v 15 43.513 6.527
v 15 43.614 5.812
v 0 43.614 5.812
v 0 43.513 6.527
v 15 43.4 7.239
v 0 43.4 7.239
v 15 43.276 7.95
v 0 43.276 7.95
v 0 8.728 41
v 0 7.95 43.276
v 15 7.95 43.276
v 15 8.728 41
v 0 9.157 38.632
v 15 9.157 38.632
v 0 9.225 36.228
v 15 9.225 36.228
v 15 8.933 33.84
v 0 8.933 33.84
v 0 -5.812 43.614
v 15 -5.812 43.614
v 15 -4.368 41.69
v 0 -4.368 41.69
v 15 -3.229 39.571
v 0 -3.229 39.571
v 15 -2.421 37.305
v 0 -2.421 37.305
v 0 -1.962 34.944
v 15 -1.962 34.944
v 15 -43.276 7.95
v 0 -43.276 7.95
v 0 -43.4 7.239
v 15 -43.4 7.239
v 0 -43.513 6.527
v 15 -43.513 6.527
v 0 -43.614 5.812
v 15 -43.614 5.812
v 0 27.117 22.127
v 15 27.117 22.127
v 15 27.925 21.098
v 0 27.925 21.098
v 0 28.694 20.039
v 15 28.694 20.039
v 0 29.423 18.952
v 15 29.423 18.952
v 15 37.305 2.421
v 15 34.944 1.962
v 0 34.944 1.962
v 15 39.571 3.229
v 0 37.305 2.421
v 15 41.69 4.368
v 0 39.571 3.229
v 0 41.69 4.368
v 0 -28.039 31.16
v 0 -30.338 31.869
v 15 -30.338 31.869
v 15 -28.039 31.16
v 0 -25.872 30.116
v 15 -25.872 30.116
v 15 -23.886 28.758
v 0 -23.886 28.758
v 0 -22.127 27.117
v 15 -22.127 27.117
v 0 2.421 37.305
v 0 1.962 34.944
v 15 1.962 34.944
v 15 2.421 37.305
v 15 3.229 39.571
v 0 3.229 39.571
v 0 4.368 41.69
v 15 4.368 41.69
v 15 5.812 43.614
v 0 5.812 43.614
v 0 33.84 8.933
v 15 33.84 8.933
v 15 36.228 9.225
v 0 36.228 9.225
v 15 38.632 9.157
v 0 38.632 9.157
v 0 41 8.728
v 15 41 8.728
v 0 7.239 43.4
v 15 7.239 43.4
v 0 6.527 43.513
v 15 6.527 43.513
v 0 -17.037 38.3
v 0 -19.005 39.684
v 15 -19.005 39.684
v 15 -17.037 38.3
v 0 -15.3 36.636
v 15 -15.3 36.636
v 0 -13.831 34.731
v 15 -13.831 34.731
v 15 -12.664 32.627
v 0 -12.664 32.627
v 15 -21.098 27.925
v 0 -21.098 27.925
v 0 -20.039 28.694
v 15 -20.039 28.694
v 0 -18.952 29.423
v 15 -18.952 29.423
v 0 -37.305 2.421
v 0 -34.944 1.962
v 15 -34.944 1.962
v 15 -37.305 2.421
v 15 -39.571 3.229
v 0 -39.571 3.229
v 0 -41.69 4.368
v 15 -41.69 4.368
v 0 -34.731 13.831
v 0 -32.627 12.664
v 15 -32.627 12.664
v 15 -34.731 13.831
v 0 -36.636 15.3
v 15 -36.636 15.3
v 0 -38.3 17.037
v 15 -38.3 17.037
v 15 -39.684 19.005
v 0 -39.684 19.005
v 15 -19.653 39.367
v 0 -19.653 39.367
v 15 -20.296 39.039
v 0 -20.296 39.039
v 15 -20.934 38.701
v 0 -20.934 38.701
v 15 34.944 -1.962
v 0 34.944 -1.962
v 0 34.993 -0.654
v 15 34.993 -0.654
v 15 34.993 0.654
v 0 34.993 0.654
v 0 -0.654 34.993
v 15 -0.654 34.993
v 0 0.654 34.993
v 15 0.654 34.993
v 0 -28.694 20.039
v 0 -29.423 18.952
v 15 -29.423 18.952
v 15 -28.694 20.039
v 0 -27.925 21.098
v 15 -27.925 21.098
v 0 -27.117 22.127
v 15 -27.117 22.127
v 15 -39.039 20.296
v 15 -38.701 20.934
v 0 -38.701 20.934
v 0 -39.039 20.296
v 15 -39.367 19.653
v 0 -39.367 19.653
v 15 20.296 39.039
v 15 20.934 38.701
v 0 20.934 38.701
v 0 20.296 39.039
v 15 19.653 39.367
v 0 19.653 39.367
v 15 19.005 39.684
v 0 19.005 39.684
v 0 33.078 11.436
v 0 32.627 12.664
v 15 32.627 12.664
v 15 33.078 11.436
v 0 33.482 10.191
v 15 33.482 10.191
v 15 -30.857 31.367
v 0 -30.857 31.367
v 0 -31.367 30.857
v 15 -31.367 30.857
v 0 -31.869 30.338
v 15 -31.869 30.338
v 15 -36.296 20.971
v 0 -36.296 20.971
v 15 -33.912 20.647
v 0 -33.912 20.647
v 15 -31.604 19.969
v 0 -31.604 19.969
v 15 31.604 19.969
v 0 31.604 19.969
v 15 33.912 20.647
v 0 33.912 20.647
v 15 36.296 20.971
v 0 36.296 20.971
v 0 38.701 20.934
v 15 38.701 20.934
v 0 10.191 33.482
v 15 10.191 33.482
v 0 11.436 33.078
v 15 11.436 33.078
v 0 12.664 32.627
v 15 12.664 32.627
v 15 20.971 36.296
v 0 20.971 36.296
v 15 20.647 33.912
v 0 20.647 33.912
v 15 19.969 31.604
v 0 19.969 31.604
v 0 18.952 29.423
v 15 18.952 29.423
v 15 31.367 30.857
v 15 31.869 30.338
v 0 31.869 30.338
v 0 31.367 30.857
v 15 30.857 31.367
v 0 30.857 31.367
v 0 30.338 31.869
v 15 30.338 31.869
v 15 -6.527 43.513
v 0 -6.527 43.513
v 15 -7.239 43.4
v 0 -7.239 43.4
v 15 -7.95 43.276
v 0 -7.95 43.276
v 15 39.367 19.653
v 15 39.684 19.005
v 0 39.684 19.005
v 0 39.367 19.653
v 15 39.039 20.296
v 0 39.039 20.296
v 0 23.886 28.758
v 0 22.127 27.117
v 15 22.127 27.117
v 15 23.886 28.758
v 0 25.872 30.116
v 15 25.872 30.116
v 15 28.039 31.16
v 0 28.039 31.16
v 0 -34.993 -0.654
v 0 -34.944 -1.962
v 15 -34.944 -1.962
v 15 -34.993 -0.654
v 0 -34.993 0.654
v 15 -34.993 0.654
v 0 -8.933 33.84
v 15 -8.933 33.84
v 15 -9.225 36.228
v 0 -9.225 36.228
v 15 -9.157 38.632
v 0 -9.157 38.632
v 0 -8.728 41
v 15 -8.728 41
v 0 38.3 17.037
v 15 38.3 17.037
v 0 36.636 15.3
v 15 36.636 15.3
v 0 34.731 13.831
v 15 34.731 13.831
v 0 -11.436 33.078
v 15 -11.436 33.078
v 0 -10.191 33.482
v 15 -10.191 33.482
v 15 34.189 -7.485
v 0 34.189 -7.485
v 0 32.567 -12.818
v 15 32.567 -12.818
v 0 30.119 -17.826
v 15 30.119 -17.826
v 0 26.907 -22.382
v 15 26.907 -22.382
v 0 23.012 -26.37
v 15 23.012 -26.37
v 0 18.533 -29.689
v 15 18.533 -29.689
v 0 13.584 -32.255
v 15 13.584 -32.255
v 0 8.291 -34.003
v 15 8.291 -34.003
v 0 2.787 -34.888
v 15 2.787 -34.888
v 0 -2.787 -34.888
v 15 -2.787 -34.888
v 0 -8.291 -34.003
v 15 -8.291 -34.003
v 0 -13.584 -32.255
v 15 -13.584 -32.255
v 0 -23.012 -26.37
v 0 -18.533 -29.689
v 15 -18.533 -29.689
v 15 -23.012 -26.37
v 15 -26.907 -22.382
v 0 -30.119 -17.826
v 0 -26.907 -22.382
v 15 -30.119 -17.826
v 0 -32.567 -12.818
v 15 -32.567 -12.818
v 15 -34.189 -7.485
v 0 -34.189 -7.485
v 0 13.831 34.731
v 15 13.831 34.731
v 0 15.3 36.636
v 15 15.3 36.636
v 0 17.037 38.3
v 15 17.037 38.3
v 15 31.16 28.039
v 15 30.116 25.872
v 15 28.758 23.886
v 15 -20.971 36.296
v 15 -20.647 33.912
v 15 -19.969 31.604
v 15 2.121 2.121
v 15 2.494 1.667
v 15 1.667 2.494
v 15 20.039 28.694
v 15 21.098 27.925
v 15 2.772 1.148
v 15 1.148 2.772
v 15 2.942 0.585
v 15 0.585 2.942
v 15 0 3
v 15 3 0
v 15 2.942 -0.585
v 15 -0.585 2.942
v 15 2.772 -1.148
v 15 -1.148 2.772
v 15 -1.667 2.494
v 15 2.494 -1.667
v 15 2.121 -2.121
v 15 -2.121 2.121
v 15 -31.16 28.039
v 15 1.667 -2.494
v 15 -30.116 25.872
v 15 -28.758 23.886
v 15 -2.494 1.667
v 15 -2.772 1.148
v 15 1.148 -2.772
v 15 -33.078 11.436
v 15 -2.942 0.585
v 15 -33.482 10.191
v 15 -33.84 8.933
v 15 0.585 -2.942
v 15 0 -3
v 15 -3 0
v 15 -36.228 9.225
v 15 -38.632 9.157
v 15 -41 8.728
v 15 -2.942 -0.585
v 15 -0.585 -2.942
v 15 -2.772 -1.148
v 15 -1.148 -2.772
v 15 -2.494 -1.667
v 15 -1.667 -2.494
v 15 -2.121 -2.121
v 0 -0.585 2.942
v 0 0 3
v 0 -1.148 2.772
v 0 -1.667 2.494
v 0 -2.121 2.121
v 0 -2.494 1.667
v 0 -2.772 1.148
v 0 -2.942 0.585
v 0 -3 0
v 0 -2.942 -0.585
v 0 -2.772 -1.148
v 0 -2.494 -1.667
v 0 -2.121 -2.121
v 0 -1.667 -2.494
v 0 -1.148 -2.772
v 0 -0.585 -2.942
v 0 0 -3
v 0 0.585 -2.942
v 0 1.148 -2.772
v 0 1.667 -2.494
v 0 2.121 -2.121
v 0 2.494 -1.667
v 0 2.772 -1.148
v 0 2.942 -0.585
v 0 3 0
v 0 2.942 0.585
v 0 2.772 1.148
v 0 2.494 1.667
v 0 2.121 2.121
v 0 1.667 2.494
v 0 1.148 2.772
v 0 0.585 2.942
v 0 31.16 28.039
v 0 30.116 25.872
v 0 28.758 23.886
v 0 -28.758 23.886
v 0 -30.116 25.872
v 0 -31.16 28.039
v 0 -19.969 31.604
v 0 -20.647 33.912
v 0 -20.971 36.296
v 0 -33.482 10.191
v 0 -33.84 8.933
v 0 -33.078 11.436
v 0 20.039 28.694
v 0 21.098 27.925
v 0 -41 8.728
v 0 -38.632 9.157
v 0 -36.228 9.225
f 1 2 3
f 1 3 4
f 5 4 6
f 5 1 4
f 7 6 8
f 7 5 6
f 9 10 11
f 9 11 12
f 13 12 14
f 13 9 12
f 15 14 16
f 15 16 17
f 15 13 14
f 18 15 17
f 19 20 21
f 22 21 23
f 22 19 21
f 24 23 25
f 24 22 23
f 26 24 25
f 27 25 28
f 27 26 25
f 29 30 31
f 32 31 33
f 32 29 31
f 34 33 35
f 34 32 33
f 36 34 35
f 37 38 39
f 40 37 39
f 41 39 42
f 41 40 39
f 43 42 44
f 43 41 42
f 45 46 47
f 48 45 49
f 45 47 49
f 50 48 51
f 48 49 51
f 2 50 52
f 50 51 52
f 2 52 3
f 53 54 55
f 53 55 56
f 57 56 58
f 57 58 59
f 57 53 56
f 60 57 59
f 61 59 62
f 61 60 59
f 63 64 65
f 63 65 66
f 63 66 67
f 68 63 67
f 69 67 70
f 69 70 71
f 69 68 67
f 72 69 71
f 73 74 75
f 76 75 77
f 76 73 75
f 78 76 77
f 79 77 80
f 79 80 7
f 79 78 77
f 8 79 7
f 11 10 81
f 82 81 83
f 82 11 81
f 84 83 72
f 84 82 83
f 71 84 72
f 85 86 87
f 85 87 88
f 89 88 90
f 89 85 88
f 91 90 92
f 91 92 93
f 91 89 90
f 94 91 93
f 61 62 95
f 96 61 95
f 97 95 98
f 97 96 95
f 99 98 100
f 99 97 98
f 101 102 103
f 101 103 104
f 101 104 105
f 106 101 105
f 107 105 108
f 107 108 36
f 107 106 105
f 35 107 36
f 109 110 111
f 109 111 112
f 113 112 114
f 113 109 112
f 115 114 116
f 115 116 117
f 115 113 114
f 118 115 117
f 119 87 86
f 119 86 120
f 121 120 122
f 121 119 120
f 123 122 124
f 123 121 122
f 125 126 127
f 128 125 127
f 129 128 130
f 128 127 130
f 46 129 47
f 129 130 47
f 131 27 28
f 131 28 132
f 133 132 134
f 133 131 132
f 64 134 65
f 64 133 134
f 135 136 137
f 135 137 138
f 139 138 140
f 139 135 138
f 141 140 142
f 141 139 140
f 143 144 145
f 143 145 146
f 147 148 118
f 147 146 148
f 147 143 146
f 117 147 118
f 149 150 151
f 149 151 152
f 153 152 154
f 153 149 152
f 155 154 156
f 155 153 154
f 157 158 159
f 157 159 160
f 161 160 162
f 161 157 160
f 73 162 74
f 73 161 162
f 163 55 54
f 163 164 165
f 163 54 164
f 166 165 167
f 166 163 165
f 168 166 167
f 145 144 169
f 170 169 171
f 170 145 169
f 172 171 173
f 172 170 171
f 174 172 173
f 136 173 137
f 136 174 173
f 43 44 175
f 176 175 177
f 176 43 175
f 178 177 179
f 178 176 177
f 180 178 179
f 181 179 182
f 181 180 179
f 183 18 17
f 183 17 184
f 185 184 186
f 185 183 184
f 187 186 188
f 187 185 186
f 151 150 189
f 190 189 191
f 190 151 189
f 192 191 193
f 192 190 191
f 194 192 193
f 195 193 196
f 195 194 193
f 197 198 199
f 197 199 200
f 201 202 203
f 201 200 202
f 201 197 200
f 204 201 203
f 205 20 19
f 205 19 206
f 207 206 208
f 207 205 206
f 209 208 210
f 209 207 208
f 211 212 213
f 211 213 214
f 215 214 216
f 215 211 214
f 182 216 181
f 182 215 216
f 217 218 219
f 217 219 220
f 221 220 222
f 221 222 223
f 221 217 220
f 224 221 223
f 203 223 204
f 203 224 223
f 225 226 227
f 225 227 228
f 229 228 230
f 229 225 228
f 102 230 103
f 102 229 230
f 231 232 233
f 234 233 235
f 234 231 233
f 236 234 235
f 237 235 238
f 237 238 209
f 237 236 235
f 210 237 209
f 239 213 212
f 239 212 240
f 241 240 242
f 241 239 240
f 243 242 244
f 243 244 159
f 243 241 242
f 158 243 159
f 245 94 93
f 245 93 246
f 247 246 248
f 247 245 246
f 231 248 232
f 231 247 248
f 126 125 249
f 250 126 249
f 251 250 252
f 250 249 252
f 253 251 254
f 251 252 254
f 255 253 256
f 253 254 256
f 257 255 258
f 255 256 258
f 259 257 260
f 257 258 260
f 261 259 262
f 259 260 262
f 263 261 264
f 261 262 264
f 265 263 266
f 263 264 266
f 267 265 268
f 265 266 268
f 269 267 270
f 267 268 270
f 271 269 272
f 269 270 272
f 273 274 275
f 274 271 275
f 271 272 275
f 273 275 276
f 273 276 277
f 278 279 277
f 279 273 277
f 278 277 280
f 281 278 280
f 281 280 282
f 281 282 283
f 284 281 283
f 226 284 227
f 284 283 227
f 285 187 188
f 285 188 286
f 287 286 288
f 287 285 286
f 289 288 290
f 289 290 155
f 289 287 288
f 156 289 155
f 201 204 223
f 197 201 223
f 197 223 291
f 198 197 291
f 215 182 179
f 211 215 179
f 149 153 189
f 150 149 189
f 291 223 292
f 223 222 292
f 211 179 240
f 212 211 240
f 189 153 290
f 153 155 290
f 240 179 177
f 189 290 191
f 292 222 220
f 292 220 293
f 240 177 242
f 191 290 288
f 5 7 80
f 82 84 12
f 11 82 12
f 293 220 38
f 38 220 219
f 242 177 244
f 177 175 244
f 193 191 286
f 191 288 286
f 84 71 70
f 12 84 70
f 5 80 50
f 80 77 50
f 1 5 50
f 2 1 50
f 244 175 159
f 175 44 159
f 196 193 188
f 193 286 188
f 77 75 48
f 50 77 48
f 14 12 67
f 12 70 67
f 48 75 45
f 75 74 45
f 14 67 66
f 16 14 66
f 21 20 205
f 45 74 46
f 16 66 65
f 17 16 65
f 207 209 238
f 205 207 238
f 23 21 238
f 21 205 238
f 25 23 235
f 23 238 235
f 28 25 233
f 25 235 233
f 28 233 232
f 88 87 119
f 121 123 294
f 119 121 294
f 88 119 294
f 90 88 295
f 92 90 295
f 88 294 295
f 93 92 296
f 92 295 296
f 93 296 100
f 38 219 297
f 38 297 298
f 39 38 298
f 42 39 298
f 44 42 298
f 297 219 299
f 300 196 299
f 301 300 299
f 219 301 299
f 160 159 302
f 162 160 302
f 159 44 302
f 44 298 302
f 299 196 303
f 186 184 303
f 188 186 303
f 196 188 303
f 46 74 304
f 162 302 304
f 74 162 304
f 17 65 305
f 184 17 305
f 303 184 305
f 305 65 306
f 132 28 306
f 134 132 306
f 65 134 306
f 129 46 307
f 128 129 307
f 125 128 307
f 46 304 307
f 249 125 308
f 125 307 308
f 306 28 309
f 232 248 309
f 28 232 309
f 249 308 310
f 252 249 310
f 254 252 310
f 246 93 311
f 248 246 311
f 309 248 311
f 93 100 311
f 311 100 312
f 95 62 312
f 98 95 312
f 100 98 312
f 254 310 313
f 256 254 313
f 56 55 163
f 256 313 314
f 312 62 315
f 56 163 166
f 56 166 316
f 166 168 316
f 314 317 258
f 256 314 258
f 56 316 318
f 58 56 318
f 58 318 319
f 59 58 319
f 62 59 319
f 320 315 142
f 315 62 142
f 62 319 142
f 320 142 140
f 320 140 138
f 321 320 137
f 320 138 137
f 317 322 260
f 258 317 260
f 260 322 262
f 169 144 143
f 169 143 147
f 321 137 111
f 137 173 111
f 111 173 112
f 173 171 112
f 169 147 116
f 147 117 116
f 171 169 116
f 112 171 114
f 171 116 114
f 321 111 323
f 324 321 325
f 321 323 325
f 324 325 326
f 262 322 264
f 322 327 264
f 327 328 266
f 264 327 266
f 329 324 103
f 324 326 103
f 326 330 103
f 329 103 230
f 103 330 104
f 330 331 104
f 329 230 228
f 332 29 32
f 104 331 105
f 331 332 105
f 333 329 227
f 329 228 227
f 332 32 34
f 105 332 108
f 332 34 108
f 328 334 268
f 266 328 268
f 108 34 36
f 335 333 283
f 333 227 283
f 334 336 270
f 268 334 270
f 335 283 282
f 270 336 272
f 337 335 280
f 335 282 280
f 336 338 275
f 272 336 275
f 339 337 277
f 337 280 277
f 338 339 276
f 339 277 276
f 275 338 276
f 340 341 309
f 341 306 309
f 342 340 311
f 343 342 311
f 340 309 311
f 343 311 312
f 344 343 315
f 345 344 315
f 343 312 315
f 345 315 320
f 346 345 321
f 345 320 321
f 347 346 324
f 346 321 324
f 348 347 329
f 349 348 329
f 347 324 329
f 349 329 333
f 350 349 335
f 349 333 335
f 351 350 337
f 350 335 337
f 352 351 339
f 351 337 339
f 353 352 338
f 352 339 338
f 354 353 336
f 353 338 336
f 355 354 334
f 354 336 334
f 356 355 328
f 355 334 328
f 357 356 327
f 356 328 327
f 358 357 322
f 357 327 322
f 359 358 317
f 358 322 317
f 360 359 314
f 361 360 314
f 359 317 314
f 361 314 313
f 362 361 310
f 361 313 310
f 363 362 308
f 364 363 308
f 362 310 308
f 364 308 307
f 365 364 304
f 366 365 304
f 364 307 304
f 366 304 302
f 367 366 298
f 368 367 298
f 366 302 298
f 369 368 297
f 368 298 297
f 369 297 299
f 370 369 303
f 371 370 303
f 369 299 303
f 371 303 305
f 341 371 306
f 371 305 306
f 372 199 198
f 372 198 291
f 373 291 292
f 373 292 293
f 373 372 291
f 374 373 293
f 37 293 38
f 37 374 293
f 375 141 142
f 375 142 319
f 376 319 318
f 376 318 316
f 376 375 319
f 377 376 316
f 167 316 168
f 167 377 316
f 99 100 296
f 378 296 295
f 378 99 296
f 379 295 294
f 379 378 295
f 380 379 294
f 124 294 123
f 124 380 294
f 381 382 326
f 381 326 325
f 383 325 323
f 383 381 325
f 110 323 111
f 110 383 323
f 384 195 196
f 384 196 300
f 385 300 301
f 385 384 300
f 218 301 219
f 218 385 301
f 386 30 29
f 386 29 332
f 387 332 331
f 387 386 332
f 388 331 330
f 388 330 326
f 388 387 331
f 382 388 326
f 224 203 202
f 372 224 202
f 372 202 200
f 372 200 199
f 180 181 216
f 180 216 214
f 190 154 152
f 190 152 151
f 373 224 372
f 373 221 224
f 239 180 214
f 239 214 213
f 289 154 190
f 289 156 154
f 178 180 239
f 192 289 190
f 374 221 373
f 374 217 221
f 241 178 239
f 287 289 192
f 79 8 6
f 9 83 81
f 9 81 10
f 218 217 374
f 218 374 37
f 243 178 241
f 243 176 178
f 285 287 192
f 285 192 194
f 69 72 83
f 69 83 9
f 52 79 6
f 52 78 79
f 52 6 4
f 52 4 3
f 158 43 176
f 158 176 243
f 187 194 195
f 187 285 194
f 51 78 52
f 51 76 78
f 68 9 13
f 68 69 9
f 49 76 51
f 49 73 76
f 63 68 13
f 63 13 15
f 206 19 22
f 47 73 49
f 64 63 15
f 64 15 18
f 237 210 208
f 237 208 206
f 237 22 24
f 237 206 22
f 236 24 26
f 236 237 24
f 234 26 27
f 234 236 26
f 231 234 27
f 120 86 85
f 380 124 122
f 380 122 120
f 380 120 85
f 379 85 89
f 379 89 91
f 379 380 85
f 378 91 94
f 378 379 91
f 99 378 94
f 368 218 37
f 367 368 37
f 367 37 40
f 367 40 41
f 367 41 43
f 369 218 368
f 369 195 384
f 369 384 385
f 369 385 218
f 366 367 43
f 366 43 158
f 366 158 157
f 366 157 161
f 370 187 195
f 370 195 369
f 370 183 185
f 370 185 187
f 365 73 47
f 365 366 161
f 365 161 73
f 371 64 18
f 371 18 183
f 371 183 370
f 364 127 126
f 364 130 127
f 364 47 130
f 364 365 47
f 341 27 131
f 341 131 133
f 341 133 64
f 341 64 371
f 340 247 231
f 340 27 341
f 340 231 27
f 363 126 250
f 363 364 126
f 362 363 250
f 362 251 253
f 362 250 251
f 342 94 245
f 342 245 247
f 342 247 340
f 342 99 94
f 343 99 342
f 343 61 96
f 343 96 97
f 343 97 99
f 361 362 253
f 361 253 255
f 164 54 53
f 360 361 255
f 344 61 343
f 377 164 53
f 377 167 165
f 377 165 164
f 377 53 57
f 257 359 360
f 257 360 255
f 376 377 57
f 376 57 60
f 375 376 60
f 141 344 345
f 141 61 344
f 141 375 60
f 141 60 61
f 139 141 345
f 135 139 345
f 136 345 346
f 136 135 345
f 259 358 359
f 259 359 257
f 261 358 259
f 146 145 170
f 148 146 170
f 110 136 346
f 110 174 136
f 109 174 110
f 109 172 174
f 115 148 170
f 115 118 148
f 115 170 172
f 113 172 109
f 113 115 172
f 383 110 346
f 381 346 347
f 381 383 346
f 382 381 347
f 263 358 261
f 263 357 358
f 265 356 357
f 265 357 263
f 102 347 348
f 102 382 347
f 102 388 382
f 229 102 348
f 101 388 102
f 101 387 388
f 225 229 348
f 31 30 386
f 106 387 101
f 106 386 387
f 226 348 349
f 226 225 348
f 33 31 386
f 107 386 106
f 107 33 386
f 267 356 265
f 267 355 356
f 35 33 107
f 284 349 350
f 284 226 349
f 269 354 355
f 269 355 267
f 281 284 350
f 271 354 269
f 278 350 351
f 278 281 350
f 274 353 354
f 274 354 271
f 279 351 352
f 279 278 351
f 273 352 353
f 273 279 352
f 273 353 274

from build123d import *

# Parameters (mm, degrees)
BASPROSKE_W        = 15
BASPROSKE_H        = 44
TOOTHCUT_DEPTH     = 65.007812023
TEETHCUTS_DEPTH    = 15
BORSKE_R           = 3
BORE_DEPTH         = 50.0000508
CUT_EXTRUDE1_REACH = 65.743


# Read off the part's stored shape, not the designer's step: TeethCuts
with BuildPart() as part:
    # BasProSke → Base-Revolve (revolve)
    with BuildSketch(Plane(origin=(0, 0, 0), x_dir=(1, 0, 0), z_dir=(0, 1, 0)), mode=Mode.PRIVATE) as base_revolve_sk:
        with Locations((7.5, 22)):
            Rectangle(BASPROSKE_W, BASPROSKE_H)
    revolve(base_revolve_sk.sketch.rotate(Axis((-10, 0, 0), (1, 0, 0)), 180), axis=Axis((-10, 0, 0), (1, 0, 0)))

    # TooCutSke → ToothCut (cut, through all)
    with BuildSketch(Plane(origin=(0, 0, 0), x_dir=(0, 0, -1), z_dir=(1, 0, 0))):
        with BuildLine():
            ThreePointArc((1.961730392, 34.943978235), (0, 34.999), (-1.961730392, 34.943978235))
            ThreePointArc((-1.961730392, 34.943978235), (-3.235659864, 39.585086827), (-5.832115241, 43.637395396))
            ThreePointArc((-5.832115241, 43.637395396), (0, 44.0254), (5.832115241, 43.637395396))
            ThreePointArc((5.832115241, 43.637395396), (3.235659864, 39.585086827), (1.961730392, 34.943978235))
        make_face()
    extrude(amount=TOOTHCUT_DEPTH, mode=Mode.SUBTRACT)

    # TeethCuts outline → TeethCuts (cut)
    with BuildSketch(Plane.YZ):
        with BuildLine():
            ThreePointArc((39.683804298, 19.005148682), (36.636439054, 15.299557845), (32.627490176, 12.663999598))
            ThreePointArc((32.627490176, 12.663999598), (33.286027014, 10.815285786), (33.839906235, 8.932566653))
            ThreePointArc((33.839906235, 8.932566653), (38.632356276, 9.156756269), (43.275818192, 7.950066657))
            ThreePointArc((43.275818192, 7.950066657), (41.846486717, 13.596747753), (39.683804298, 19.005148682))
        make_face()
        with BuildLine():
            ThreePointArc((-34.943978235, 1.961730392), (-39.571147477, 3.229461904), (-43.614454593, 5.812000568))
            ThreePointArc((-43.614454593, 5.812000568), (-44, 0), (-43.614454592, -5.812000568))
            ThreePointArc((-43.614454592, -5.812000568), (-39.571147477, -3.229461904), (-34.943978235, -1.961730392))
            ThreePointArc((-34.943978235, -1.961730392), (-34.999, 0), (-34.943978235, 1.961730392))
        make_face()
        with BuildLine():
            ThreePointArc((-32.627490176, 12.663999598), (-36.636439054, 15.299557845), (-39.683804298, 19.005148682))
            ThreePointArc((-39.683804298, 19.005148682), (-41.846486717, 13.596747753), (-43.275818192, 7.950066657))
            ThreePointArc((-43.275818192, 7.950066657), (-38.632356276, 9.156756269), (-33.839906235, 8.932566653))
            ThreePointArc((-33.839906235, 8.932566653), (-33.286027014, 10.815285786), (-32.627490176, 12.663999598))
        make_face()
        with BuildLine():
            ThreePointArc((-27.117196049, 22.126628289), (-30.115500715, 25.872026467), (-31.868626746, 30.337940427))
            ThreePointArc((-31.868626746, 30.337940427), (-35.596747753, 25.862551101), (-38.701043186, 20.933925966))
            ThreePointArc((-38.701043186, 20.933925966), (-33.911960876, 20.64664734), (-29.423348436, 18.952481837))
            ThreePointArc((-29.423348436, 18.952481837), (-28.314785786, 20.571896045), (-27.117196049, 22.126628289))
        make_face()
        with BuildLine():
            ThreePointArc((-18.952481837, 29.423348436), (-20.64664734, 33.911960876), (-20.933925966, 38.701043186))
            ThreePointArc((-20.933925966, 38.701043186), (-25.862551101, 35.596747753), (-30.337940427, 31.868626746))
            ThreePointArc((-30.337940427, 31.868626746), (-25.872026467, 30.115500715), (-22.126628289, 27.117196049))
            ThreePointArc((-22.126628289, 27.117196049), (-20.571896045, 28.314785786), (-18.952481837, 29.423348436))
        make_face()
        with BuildLine():
            ThreePointArc((-8.932566653, 33.839906235), (-9.156756269, 38.632356276), (-7.950066657, 43.275818192))
            ThreePointArc((-7.950066657, 43.275818192), (-13.596747753, 41.846486717), (-19.005148682, 39.683804298))
            ThreePointArc((-19.005148682, 39.683804298), (-15.299557845, 36.636439054), (-12.663999598, 32.627490176))
            ThreePointArc((-12.663999598, 32.627490176), (-10.815285786, 33.286027014), (-8.932566653, 33.839906235))
        make_face()
        with BuildLine():
            ThreePointArc((1.961730392, 34.943978235), (3.229461904, 39.571147477), (5.812000568, 43.614454593))
            ThreePointArc((5.812000568, 43.614454593), (0, 44), (-5.812000568, 43.614454593))
            ThreePointArc((-5.812000568, 43.614454593), (-3.229461904, 39.571147477), (-1.961730392, 34.943978235))
            ThreePointArc((-1.961730392, 34.943978235), (0, 34.999), (1.961730392, 34.943978235))
        make_face()
        with BuildLine():
            ThreePointArc((12.663999598, 32.627490176), (15.299557845, 36.636439054), (19.005148682, 39.683804298))
            ThreePointArc((19.005148682, 39.683804298), (13.596747753, 41.846486717), (7.950066657, 43.275818192))
            ThreePointArc((7.950066657, 43.275818192), (9.156756269, 38.632356276), (8.932566653, 33.839906235))
            ThreePointArc((8.932566653, 33.839906235), (10.815285786, 33.286027014), (12.663999598, 32.627490176))
        make_face()
        with BuildLine():
            ThreePointArc((22.126628289, 27.117196049), (25.872026467, 30.115500715), (30.337940427, 31.868626746))
            ThreePointArc((30.337940427, 31.868626746), (25.862551101, 35.596747753), (20.933925966, 38.701043186))
            ThreePointArc((20.933925966, 38.701043186), (20.64664734, 33.911960876), (18.952481837, 29.423348436))
            ThreePointArc((18.952481837, 29.423348436), (20.571896045, 28.314785786), (22.126628289, 27.117196049))
        make_face()
        with BuildLine():
            ThreePointArc((29.423348436, 18.952481837), (33.911960876, 20.64664734), (38.701043186, 20.933925966))
            ThreePointArc((38.701043186, 20.933925966), (35.596747753, 25.862551101), (31.868626746, 30.337940427))
            ThreePointArc((31.868626746, 30.337940427), (30.115500715, 25.872026467), (27.117196049, 22.126628289))
            ThreePointArc((27.117196049, 22.126628289), (28.314785786, 20.571896045), (29.423348436, 18.952481837))
        make_face()
    extrude(amount=TEETHCUTS_DEPTH, mode=Mode.SUBTRACT)

    # BorSke → Bore (cut, symmetric)
    with BuildSketch(Plane(origin=(0, 0, 0), x_dir=(0, 0, -1), z_dir=(1, 0, 0))):
        with Locations(Location((0, 0, 0), (0, 0, 180))):
            Circle(BORSKE_R)
    extrude(amount=BORE_DEPTH, both=True, mode=Mode.SUBTRACT)

    # Sketch2 → Cut-Extrude1 (cut, up to next)
    with BuildSketch(Plane(origin=(15, 0, 0), x_dir=(0, 0, -1), z_dir=(1, 0, 0)), mode=Mode.PRIVATE) as cut_extrude1_sk1:
        with BuildLine():
            Line((1.961730392, -34.943978235), (2.123495302, -44.219744966))
            ThreePointArc((2.123495302, -44.219744966), (44.2706282, 0.080968685), (1.961730392, 44.227216632))
            Line((1.961730392, 44.227216632), (1.961730392, 34.943978235))
            ThreePointArc((1.961730392, 34.943978235), (34.999, 0), (1.961730392, -34.943978235))
        make_face()
    cut_extrude1_tool1 = extrude(cut_extrude1_sk1.sketch, amount=-CUT_EXTRUDE1_REACH, mode=Mode.PRIVATE) & part.part
    add(cut_extrude1_tool1.solids().sort_by_distance((15, 39.585597, -2.942185))[0], mode=Mode.SUBTRACT)


solid = part.part
